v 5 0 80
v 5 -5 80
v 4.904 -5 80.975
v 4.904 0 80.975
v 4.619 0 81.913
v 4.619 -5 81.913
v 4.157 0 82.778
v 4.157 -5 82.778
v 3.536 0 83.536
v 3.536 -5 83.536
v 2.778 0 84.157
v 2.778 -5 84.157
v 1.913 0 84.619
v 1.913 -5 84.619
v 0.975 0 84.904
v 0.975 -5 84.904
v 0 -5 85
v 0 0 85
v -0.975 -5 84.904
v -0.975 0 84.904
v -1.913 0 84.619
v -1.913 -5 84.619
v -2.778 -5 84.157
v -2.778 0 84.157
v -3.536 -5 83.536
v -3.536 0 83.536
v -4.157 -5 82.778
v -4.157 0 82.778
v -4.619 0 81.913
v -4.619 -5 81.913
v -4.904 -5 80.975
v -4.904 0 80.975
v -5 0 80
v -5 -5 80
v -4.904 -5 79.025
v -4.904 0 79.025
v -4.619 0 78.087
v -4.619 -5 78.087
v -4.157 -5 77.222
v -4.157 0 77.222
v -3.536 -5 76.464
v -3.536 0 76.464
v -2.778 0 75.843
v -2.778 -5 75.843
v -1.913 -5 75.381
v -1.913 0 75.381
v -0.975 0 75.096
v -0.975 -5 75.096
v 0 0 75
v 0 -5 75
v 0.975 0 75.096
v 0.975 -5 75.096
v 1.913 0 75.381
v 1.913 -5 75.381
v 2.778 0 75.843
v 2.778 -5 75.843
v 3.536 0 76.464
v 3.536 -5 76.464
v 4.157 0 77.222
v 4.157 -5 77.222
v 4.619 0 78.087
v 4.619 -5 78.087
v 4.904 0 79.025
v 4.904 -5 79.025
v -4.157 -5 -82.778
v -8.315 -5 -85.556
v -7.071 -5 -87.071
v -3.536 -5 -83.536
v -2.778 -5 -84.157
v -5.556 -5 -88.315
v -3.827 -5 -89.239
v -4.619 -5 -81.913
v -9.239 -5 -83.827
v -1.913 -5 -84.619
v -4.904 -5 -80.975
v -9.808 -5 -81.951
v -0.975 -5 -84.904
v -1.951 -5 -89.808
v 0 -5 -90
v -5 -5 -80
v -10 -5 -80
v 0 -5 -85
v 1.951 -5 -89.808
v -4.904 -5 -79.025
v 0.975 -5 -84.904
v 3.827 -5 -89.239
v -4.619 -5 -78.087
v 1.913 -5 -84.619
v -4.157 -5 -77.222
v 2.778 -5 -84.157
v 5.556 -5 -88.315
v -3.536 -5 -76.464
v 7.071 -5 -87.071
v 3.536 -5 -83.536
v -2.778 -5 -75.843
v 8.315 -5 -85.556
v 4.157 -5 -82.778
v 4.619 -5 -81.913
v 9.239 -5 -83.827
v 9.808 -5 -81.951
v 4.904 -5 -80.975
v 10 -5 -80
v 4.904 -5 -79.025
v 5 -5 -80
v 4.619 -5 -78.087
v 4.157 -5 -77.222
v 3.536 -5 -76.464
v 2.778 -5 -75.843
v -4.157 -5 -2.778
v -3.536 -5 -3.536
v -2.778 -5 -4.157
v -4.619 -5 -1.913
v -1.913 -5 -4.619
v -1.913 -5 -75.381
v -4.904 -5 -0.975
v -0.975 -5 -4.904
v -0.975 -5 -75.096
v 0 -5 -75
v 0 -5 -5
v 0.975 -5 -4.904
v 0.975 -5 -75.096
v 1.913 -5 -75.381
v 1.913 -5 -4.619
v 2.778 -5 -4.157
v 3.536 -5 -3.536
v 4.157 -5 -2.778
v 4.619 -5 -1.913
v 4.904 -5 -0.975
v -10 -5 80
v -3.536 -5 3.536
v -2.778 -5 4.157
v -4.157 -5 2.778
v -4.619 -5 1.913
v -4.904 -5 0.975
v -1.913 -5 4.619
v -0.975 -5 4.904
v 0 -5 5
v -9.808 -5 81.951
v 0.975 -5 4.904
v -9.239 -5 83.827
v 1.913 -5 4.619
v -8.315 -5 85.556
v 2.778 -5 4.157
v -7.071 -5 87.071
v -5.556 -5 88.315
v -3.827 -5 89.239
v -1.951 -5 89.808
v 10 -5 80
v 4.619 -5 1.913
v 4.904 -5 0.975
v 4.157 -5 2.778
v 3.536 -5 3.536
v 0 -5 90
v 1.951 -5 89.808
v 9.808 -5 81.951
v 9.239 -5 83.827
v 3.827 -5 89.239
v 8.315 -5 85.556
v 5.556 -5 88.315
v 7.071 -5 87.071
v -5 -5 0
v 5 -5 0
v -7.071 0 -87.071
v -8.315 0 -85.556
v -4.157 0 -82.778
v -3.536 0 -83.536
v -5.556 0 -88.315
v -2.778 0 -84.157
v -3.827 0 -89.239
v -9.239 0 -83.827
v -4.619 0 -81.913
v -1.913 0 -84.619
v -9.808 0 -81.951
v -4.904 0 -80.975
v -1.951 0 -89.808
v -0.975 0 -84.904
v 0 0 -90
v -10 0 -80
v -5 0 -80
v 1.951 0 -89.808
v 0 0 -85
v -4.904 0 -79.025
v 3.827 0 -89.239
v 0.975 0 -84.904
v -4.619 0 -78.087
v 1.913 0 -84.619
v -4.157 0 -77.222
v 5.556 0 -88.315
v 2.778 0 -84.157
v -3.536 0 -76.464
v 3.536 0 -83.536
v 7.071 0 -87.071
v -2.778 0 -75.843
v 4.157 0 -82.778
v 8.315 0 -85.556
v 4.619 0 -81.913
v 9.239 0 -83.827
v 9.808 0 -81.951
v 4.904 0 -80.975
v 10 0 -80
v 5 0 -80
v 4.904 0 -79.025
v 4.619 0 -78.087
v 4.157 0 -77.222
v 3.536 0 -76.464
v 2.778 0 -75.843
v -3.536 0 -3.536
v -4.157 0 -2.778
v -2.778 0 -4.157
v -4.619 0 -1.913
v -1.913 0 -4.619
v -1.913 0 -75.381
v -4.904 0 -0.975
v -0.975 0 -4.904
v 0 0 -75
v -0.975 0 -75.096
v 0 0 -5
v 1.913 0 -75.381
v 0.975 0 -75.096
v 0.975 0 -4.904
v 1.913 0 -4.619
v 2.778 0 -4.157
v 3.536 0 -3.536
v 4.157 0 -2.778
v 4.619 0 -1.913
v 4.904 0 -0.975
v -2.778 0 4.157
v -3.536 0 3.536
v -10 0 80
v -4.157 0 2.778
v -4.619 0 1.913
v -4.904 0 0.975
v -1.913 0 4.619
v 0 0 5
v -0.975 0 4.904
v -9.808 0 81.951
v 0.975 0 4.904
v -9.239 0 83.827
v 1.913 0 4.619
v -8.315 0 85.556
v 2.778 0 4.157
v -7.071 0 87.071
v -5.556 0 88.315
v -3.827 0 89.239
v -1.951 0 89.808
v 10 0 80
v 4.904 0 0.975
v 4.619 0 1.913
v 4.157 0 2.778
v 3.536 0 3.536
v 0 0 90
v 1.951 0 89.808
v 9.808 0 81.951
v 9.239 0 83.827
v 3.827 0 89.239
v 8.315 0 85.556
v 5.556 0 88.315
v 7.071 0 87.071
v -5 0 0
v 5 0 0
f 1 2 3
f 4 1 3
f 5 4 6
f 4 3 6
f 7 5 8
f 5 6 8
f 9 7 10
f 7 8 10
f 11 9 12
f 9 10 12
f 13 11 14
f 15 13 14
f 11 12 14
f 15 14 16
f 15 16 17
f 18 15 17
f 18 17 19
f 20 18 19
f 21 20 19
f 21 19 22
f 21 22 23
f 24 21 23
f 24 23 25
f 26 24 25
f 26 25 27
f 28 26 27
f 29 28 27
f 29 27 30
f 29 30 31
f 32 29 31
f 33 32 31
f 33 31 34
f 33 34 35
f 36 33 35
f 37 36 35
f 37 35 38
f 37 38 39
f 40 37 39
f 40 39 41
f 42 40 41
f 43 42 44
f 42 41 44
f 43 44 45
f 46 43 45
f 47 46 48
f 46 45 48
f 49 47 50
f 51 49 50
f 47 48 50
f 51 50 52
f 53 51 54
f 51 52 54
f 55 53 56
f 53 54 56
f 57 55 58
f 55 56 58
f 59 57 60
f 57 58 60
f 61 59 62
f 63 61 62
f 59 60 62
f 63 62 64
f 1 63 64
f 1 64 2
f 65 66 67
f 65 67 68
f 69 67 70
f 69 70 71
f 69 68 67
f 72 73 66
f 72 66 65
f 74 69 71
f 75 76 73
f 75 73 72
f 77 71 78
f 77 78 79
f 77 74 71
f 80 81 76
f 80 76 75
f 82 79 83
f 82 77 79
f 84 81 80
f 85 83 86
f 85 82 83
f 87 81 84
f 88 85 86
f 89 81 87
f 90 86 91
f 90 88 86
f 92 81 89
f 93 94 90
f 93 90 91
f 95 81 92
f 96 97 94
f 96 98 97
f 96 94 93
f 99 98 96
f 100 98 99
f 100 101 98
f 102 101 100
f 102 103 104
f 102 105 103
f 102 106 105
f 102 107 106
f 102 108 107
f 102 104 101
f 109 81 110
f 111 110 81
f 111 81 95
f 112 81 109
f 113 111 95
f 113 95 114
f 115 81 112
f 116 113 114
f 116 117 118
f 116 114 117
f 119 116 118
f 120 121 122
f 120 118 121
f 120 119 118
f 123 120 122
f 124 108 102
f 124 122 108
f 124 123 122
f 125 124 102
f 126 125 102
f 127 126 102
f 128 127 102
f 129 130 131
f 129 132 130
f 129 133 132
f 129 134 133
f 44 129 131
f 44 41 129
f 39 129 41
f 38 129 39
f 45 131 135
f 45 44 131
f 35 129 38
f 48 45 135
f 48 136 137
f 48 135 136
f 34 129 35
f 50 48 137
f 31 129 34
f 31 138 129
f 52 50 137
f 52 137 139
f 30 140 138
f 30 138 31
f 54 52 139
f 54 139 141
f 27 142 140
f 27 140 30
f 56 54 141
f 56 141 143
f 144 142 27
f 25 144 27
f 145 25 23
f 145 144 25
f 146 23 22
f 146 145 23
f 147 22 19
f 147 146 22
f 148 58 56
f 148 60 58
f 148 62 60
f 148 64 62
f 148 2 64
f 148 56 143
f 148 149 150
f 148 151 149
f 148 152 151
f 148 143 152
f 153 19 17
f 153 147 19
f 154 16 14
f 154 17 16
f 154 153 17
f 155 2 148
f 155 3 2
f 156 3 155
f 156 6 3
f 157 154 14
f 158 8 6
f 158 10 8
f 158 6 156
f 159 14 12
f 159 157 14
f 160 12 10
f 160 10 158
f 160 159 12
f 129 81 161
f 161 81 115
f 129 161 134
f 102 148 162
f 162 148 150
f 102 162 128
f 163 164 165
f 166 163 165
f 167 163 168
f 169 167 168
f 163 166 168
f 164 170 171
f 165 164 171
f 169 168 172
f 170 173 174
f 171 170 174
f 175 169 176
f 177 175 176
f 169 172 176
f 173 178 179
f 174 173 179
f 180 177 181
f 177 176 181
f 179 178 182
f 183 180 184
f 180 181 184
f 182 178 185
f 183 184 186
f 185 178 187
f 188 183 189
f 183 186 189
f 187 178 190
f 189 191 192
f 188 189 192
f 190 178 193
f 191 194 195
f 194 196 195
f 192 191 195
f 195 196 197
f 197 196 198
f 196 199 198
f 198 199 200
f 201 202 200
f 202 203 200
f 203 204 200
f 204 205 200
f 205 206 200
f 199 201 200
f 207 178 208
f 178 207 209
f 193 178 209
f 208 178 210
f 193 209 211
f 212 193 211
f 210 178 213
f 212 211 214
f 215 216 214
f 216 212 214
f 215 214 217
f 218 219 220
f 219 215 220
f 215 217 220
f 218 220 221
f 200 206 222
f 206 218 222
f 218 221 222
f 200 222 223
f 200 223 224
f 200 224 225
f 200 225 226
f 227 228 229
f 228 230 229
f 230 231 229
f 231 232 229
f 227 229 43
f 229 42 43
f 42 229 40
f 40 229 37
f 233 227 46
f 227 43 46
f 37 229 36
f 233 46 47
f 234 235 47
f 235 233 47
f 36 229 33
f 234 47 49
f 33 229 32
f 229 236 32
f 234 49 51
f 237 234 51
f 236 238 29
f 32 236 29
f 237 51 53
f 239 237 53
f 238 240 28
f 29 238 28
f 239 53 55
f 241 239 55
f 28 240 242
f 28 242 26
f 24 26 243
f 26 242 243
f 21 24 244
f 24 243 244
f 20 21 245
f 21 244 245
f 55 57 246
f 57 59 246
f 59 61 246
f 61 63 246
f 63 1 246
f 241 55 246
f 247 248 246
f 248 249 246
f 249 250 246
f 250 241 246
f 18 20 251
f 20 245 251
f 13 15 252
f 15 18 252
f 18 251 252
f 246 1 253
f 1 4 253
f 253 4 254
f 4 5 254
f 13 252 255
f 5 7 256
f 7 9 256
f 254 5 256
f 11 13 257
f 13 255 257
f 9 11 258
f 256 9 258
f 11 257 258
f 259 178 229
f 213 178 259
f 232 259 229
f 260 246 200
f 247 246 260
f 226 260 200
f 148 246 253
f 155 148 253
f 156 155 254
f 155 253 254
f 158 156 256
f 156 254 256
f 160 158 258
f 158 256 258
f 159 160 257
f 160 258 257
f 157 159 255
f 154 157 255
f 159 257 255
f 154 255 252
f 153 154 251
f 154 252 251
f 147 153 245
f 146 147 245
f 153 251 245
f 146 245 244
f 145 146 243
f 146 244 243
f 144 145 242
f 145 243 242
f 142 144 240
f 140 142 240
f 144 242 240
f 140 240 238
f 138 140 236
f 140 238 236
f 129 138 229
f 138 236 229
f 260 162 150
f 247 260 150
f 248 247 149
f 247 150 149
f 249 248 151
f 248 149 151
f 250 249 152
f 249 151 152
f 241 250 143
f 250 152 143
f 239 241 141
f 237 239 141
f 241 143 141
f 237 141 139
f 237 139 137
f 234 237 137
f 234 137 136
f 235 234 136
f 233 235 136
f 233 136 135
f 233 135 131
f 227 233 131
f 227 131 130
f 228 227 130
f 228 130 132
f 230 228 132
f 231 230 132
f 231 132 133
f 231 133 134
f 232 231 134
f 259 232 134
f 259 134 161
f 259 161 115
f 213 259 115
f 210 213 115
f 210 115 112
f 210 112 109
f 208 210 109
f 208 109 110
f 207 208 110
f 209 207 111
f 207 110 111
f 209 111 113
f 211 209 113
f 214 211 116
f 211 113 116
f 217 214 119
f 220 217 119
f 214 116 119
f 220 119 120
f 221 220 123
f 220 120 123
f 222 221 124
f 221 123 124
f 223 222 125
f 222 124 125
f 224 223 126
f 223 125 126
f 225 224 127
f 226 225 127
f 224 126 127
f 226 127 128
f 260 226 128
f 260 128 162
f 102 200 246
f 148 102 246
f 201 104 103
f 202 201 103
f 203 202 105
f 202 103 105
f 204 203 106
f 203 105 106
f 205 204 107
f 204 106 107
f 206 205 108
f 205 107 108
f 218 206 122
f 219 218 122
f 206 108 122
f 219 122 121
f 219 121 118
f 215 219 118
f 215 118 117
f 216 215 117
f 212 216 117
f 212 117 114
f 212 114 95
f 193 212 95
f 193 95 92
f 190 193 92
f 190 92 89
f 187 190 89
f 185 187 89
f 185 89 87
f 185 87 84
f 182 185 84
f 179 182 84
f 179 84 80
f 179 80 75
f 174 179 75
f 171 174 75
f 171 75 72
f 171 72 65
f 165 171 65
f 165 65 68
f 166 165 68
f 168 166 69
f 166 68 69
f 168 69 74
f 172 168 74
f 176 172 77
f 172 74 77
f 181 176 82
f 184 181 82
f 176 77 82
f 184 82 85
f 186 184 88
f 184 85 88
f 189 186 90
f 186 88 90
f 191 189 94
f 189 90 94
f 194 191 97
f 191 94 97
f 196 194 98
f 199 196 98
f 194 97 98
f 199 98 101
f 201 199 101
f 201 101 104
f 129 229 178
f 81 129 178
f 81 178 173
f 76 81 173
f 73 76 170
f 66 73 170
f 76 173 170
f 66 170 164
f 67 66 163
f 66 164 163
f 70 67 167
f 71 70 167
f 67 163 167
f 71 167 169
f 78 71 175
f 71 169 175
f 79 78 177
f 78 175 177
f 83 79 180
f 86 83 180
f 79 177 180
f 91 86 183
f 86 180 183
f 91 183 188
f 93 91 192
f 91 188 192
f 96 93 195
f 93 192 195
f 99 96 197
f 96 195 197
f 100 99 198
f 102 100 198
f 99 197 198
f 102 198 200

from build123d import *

# Parameters (mm, degrees)
F1_DEPTH = 5
F2_R     = 5
F3_DEPTH = 25


with BuildPart() as f1:
    # F0 (on Front) → F1 (new body)
    with BuildSketch(Plane.XZ):
        with BuildLine():
            ThreePointArc((-10, 80), (0, 70), (10, 80))
            ThreePointArc((10, 80), (0, 90), (-10, 80))
        make_face()
        with BuildLine():
            Line((10, -80), (10, 80))
            ThreePointArc((10, 80), (0, 70), (-10, 80))
            Line((-10, 80), (-10, -80))
            ThreePointArc((-10, -80), (0, -70), (10, -80))
        make_face()
        with BuildLine():
            ThreePointArc((-10, -80), (0, -90), (10, -80))
            ThreePointArc((10, -80), (0, -70), (-10, -80))
        make_face()
    extrude(amount=F1_DEPTH)

    # F2 (on face) → F3 (cut)
    with BuildSketch(Plane.XZ.offset(5)):
        with Locations((0, 80)):
            Circle(F2_R)
        with Locations((0, -80)):
            Circle(F2_R)
        Circle(F2_R)
    extrude(amount=-F3_DEPTH, mode=Mode.SUBTRACT)


solid = f1.part
